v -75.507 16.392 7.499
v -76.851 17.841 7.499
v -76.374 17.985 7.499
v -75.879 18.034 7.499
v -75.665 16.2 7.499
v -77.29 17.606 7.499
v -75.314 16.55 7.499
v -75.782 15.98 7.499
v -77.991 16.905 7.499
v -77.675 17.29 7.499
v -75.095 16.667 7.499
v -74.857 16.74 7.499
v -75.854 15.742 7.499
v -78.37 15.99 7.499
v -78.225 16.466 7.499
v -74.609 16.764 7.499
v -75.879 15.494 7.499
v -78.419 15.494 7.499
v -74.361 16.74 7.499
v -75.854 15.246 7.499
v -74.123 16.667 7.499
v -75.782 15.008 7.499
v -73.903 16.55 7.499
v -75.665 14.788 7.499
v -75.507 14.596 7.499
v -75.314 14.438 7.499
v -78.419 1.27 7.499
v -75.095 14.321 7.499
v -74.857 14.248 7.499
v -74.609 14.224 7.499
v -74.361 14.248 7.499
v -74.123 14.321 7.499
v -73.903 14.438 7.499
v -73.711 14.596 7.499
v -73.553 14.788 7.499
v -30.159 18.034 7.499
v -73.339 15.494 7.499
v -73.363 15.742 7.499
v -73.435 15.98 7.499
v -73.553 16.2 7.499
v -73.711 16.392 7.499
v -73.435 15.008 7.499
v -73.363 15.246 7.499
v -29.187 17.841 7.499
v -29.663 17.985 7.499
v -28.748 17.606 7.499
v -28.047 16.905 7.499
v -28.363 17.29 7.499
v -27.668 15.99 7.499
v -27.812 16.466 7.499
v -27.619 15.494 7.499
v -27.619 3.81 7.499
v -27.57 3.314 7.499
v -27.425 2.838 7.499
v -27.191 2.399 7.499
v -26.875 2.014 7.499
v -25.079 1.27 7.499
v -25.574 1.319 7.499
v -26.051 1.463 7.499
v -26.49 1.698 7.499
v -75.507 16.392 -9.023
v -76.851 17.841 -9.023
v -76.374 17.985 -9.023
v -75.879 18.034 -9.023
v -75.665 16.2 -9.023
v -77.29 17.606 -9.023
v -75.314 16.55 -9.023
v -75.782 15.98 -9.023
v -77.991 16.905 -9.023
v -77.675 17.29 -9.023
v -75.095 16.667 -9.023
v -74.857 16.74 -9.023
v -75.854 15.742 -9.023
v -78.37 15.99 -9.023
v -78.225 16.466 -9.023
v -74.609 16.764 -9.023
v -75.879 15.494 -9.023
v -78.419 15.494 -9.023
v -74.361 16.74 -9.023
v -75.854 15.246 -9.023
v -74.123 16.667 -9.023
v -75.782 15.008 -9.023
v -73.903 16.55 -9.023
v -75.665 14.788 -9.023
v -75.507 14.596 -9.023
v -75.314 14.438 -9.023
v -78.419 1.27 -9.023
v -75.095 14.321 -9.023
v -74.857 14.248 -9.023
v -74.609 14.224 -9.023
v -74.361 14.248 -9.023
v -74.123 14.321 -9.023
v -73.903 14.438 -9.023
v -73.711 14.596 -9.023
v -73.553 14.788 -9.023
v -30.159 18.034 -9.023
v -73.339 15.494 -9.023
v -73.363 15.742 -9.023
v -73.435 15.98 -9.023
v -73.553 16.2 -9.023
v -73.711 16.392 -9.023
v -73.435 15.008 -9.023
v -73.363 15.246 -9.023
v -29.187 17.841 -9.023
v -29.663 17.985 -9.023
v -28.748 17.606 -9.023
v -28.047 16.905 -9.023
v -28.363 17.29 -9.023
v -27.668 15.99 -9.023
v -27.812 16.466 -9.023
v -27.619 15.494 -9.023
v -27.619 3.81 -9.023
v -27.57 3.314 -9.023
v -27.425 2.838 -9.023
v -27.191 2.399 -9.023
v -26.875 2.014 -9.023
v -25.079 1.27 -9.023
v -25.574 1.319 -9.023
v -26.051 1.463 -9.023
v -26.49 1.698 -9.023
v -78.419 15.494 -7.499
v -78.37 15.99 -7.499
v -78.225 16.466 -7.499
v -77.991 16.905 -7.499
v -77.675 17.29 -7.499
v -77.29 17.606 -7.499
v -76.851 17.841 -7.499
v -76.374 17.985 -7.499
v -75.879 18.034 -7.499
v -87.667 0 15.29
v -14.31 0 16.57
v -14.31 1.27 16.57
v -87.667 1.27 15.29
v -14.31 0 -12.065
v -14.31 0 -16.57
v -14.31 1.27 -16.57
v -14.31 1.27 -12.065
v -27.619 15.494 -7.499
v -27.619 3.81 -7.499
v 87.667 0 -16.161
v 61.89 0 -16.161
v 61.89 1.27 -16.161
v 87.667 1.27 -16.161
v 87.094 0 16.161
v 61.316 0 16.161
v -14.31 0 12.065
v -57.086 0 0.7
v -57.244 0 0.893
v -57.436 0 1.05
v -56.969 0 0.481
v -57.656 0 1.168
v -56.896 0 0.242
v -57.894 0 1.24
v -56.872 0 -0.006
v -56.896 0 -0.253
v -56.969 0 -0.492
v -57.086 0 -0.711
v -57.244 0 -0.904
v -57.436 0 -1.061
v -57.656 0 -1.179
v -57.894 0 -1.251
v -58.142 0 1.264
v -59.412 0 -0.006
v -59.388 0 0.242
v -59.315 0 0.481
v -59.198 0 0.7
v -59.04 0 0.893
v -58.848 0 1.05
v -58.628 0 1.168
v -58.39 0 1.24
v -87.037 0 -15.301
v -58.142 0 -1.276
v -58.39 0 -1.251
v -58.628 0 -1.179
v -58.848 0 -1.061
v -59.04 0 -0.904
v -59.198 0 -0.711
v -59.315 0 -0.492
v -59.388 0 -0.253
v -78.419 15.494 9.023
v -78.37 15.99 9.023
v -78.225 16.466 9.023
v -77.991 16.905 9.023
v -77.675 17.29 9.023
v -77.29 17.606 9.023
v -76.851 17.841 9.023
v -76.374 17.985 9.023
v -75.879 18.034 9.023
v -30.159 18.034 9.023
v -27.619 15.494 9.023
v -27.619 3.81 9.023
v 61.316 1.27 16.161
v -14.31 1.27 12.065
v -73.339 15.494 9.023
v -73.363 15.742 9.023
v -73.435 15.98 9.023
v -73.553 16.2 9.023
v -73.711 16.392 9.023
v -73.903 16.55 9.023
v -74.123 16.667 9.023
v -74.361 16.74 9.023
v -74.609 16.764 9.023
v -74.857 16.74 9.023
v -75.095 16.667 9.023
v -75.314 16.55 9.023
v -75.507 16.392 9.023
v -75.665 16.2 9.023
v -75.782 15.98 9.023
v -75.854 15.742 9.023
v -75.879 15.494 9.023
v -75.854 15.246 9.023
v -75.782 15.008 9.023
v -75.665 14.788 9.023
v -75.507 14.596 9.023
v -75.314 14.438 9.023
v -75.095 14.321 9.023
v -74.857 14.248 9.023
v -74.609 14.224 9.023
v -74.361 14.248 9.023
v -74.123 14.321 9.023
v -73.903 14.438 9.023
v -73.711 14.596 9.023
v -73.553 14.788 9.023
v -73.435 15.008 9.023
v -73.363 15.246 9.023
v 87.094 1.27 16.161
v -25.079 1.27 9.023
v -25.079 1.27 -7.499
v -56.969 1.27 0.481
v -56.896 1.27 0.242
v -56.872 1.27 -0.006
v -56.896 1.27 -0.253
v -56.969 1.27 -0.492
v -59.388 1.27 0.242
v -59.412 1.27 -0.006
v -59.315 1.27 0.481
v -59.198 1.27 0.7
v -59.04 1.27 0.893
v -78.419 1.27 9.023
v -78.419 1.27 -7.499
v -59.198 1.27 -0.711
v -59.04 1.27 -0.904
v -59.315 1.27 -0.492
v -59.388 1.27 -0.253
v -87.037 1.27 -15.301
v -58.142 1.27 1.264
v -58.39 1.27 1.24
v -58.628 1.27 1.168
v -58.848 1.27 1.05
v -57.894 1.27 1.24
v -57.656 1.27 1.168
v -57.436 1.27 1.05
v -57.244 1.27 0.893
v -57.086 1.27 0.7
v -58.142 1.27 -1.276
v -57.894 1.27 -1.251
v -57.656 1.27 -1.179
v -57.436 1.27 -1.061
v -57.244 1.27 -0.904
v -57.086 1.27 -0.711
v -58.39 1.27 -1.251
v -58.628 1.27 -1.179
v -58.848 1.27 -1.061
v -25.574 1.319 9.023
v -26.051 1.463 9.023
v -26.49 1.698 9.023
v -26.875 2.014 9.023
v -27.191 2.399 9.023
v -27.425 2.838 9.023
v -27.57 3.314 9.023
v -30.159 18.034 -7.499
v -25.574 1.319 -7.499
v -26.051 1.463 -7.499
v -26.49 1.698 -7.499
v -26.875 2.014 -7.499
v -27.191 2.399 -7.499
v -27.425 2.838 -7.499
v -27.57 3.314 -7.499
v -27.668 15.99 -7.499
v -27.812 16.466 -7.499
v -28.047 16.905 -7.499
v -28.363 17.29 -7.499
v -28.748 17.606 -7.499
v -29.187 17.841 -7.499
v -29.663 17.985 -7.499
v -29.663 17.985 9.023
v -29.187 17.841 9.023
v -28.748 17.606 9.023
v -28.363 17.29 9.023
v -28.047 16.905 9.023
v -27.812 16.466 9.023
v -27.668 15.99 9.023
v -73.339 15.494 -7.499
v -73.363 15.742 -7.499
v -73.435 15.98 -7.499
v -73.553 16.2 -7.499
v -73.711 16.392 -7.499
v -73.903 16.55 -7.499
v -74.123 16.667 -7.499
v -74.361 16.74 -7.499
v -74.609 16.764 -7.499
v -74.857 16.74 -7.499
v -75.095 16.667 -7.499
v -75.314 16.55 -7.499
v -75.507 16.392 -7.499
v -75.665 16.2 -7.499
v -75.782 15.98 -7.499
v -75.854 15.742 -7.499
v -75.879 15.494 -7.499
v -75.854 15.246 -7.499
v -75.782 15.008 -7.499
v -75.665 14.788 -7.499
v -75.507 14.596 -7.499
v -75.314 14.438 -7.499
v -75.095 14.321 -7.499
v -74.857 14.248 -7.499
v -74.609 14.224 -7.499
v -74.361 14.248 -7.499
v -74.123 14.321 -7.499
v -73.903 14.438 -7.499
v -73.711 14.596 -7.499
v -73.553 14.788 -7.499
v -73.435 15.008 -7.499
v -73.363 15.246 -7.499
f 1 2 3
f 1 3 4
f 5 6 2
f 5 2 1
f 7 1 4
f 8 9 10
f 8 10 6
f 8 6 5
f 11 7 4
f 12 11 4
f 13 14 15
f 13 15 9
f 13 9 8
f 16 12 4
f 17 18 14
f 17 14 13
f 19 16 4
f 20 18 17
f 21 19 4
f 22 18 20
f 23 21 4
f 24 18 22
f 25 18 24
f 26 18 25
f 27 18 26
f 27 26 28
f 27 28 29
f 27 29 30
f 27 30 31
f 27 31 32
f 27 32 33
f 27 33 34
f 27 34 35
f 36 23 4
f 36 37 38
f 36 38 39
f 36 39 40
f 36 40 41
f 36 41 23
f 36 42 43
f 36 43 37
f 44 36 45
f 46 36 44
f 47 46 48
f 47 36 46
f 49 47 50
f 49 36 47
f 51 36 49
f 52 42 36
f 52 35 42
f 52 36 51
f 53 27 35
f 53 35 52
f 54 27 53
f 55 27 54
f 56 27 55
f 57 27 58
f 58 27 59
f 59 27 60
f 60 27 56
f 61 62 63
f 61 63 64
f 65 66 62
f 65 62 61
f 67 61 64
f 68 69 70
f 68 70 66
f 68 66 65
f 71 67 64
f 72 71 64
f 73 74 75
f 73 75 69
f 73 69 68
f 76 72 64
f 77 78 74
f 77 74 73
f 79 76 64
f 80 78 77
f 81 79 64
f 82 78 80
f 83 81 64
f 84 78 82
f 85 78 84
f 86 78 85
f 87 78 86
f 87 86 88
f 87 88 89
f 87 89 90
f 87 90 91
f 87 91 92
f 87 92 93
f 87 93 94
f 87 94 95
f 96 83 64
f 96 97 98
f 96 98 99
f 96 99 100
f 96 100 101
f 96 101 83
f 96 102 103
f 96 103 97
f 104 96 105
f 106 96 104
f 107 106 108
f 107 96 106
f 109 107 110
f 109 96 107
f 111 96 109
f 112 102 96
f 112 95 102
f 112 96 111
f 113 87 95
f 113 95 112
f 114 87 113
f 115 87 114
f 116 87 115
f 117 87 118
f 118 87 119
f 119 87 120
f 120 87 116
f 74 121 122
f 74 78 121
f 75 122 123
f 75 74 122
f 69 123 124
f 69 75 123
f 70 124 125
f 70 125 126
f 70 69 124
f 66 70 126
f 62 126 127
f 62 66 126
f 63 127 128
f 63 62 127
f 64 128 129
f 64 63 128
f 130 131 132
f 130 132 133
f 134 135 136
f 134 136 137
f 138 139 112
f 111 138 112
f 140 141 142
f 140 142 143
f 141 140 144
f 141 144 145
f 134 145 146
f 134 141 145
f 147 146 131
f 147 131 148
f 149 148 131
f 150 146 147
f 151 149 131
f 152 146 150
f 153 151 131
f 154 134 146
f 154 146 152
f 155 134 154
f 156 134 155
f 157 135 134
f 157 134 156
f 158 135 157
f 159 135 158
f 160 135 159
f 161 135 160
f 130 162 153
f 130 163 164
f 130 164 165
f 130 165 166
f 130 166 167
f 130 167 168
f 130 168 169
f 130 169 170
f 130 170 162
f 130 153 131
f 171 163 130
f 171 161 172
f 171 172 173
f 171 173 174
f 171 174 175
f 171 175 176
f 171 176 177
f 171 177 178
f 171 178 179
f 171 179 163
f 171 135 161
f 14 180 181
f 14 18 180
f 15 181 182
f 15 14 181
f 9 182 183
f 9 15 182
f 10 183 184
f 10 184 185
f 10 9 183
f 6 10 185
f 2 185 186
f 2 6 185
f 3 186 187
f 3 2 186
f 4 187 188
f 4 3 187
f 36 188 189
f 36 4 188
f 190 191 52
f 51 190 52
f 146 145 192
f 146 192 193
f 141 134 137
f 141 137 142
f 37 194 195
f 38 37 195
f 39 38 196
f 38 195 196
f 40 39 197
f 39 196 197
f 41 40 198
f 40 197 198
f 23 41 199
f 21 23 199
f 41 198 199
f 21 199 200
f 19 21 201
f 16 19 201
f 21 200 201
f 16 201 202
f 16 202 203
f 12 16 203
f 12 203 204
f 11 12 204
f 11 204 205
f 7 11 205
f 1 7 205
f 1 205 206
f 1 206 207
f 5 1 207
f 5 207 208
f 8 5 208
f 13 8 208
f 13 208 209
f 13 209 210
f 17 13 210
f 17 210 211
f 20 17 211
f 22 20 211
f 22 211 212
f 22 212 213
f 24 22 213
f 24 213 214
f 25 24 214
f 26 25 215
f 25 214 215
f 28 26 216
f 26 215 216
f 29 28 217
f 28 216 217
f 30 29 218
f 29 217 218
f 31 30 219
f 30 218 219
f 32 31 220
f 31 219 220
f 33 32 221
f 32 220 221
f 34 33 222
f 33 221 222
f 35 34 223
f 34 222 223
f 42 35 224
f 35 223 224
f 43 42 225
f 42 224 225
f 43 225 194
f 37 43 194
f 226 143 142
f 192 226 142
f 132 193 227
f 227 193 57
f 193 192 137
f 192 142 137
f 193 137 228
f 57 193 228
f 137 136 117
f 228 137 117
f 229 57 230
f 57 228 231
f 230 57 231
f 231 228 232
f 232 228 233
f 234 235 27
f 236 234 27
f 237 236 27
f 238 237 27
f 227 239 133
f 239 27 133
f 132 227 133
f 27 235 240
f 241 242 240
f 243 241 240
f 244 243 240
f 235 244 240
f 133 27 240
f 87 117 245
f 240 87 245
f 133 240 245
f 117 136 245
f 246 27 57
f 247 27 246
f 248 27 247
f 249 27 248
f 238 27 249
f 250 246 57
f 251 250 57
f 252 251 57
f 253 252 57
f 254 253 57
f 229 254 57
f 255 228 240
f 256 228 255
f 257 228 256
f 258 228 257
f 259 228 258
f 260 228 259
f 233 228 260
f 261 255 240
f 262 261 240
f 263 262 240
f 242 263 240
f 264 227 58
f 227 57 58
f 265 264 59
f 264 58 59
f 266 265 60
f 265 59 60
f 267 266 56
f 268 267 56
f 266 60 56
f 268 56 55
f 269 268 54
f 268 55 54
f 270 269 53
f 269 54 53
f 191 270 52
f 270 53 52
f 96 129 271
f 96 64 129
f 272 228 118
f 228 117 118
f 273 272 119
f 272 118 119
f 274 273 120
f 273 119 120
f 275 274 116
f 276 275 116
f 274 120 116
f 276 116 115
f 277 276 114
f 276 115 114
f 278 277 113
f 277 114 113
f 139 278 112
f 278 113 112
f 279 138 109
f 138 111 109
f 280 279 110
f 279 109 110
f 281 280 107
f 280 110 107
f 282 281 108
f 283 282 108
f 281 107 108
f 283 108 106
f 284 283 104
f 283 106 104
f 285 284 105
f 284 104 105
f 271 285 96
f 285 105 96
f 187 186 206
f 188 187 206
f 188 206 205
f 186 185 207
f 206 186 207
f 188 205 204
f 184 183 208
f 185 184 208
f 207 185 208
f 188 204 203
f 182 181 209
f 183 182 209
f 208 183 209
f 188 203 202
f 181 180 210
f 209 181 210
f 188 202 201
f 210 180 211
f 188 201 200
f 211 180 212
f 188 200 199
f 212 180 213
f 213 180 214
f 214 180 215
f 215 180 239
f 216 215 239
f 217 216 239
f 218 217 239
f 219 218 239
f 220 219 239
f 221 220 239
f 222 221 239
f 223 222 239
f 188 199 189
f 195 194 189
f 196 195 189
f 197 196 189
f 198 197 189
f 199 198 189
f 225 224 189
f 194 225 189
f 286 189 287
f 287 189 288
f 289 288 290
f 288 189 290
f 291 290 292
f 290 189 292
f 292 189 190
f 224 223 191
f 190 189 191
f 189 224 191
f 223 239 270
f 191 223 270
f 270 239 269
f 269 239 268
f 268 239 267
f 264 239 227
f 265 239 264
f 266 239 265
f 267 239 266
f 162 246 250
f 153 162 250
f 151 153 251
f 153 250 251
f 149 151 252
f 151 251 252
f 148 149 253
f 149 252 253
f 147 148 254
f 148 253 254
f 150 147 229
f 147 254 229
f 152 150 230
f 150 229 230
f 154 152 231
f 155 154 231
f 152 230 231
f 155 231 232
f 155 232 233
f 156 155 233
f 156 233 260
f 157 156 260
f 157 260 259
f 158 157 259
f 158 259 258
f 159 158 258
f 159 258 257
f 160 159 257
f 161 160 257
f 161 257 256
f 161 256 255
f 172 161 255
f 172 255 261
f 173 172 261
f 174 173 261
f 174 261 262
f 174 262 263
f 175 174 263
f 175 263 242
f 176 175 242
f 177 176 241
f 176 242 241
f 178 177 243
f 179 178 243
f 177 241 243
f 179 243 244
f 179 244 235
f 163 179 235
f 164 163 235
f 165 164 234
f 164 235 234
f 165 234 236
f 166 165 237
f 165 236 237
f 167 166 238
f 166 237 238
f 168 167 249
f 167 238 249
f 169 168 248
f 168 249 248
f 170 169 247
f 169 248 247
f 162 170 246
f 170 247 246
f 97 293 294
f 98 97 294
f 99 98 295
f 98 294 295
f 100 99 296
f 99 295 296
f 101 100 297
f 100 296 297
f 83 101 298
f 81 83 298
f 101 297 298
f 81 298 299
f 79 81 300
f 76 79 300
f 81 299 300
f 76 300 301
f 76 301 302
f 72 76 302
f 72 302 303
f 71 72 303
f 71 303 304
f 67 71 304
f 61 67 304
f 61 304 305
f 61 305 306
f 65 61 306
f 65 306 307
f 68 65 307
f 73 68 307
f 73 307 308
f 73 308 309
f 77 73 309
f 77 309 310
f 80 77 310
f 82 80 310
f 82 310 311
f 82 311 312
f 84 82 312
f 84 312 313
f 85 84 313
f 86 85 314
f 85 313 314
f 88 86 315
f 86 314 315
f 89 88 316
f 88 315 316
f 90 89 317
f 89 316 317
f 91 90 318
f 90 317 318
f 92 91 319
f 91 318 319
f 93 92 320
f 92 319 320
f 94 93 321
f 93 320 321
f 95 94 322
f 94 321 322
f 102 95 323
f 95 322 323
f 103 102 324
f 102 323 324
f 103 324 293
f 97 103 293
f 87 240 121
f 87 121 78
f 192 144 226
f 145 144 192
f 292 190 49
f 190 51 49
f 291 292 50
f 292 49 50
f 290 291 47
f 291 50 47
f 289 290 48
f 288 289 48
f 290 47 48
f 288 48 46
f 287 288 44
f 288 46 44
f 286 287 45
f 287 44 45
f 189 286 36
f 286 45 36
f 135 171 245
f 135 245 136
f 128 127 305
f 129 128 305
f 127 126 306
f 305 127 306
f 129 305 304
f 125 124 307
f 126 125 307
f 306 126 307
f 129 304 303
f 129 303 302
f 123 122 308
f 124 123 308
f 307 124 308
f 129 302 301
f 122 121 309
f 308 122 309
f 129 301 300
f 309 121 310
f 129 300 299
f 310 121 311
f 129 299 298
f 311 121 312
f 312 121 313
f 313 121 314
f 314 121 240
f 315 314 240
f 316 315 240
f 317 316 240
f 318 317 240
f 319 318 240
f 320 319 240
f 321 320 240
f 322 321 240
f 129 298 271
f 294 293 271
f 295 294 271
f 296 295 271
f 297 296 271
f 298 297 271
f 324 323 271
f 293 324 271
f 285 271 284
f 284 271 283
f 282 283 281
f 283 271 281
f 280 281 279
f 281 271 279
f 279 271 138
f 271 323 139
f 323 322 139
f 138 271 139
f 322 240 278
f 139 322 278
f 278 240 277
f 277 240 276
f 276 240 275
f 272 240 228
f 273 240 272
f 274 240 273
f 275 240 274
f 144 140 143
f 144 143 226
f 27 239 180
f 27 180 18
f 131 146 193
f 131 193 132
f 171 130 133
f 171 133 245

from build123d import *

# Parameters (mm, degrees)
BOSS_EXTRUDE1_DEPTH = 1.27
SKETCH5_W           = 50.8
SKETCH5_H           = 1.524
BOSS_EXTRUDE2_DEPTH = 16.764
SKETCH6_R           = 1.27
CUT_EXTRUDE1_DEPTH  = 19.304
FILLET1_R           = 2.54
SKETCH7_R           = 1.27
CUT_EXTRUDE2_DEPTH  = 19.304


with BuildPart() as part:
    # Sketch4 → Boss-Extrude1 (new body)
    with BuildSketch(Plane(origin=(0, 0, 0), x_dir=(1, 0, 0), z_dir=(0, 1, 0))):
        Polygon((87.667304241, 16.16075), (87.093635827, -16.16075), (61.31636847, -16.16075), (-14.309963117, -12.065), (-14.309963117, -16.570075948), (-87.667304241, -15.289618795), (-87.036695722, 15.300626108), (-14.309963117, 16.570075948), (-14.309963117, 12.065), (61.890036883, 16.16075), align=None)
    extrude(amount=BOSS_EXTRUDE1_DEPTH)

    # Sketch5 → Boss-Extrude2 (add)
    with BuildSketch(Plane(origin=(0, 1.27, 0), x_dir=(1, 0, 0), z_dir=(0, 1, 0))):
        with Locations((-53.018825687, -8.260503656)):
            Rectangle(SKETCH5_W, SKETCH5_H)
        with Locations((-53.018825687, 8.260503656)):
            Rectangle(SKETCH5_W, SKETCH5_H)
    extrude(amount=BOSS_EXTRUDE2_DEPTH)

    # Sketch6 → Cut-Extrude1 (cut)
    with BuildSketch(Plane.XY.offset(9.022503656)):
        with Locations((-74.608825687, 15.494)):
            Circle(SKETCH6_R)
    extrude(amount=-CUT_EXTRUDE1_DEPTH, mode=Mode.SUBTRACT)

    # Fillet1
    fillet1_edges = [part.edges().sort_by_distance(p)[0] for p in [
        (-27.618825687, 1.27, -8.260503656),
        (-27.618825687, 18.034, -8.260503656),
        (-78.418825687, 18.034, -8.260503656),
        (-27.618825687, 1.27, 8.260503656),
        (-78.418825687, 18.034, 8.260503656),
        (-27.618825687, 18.034, 8.260503656),
    ]]
    fillet(fillet1_edges, radius=FILLET1_R)

    # Sketch7 → Cut-Extrude2 (cut)
    with BuildSketch(Plane(origin=(0, 1.27, 0), x_dir=(1, 0, 0), z_dir=(0, 1, 0))):
        with Locations(Location((-58.141999981, 0.005503656, 0), (0, 0, 270))):
            Circle(SKETCH7_R)
    extrude(amount=-CUT_EXTRUDE2_DEPTH, mode=Mode.SUBTRACT)


solid = part.part
